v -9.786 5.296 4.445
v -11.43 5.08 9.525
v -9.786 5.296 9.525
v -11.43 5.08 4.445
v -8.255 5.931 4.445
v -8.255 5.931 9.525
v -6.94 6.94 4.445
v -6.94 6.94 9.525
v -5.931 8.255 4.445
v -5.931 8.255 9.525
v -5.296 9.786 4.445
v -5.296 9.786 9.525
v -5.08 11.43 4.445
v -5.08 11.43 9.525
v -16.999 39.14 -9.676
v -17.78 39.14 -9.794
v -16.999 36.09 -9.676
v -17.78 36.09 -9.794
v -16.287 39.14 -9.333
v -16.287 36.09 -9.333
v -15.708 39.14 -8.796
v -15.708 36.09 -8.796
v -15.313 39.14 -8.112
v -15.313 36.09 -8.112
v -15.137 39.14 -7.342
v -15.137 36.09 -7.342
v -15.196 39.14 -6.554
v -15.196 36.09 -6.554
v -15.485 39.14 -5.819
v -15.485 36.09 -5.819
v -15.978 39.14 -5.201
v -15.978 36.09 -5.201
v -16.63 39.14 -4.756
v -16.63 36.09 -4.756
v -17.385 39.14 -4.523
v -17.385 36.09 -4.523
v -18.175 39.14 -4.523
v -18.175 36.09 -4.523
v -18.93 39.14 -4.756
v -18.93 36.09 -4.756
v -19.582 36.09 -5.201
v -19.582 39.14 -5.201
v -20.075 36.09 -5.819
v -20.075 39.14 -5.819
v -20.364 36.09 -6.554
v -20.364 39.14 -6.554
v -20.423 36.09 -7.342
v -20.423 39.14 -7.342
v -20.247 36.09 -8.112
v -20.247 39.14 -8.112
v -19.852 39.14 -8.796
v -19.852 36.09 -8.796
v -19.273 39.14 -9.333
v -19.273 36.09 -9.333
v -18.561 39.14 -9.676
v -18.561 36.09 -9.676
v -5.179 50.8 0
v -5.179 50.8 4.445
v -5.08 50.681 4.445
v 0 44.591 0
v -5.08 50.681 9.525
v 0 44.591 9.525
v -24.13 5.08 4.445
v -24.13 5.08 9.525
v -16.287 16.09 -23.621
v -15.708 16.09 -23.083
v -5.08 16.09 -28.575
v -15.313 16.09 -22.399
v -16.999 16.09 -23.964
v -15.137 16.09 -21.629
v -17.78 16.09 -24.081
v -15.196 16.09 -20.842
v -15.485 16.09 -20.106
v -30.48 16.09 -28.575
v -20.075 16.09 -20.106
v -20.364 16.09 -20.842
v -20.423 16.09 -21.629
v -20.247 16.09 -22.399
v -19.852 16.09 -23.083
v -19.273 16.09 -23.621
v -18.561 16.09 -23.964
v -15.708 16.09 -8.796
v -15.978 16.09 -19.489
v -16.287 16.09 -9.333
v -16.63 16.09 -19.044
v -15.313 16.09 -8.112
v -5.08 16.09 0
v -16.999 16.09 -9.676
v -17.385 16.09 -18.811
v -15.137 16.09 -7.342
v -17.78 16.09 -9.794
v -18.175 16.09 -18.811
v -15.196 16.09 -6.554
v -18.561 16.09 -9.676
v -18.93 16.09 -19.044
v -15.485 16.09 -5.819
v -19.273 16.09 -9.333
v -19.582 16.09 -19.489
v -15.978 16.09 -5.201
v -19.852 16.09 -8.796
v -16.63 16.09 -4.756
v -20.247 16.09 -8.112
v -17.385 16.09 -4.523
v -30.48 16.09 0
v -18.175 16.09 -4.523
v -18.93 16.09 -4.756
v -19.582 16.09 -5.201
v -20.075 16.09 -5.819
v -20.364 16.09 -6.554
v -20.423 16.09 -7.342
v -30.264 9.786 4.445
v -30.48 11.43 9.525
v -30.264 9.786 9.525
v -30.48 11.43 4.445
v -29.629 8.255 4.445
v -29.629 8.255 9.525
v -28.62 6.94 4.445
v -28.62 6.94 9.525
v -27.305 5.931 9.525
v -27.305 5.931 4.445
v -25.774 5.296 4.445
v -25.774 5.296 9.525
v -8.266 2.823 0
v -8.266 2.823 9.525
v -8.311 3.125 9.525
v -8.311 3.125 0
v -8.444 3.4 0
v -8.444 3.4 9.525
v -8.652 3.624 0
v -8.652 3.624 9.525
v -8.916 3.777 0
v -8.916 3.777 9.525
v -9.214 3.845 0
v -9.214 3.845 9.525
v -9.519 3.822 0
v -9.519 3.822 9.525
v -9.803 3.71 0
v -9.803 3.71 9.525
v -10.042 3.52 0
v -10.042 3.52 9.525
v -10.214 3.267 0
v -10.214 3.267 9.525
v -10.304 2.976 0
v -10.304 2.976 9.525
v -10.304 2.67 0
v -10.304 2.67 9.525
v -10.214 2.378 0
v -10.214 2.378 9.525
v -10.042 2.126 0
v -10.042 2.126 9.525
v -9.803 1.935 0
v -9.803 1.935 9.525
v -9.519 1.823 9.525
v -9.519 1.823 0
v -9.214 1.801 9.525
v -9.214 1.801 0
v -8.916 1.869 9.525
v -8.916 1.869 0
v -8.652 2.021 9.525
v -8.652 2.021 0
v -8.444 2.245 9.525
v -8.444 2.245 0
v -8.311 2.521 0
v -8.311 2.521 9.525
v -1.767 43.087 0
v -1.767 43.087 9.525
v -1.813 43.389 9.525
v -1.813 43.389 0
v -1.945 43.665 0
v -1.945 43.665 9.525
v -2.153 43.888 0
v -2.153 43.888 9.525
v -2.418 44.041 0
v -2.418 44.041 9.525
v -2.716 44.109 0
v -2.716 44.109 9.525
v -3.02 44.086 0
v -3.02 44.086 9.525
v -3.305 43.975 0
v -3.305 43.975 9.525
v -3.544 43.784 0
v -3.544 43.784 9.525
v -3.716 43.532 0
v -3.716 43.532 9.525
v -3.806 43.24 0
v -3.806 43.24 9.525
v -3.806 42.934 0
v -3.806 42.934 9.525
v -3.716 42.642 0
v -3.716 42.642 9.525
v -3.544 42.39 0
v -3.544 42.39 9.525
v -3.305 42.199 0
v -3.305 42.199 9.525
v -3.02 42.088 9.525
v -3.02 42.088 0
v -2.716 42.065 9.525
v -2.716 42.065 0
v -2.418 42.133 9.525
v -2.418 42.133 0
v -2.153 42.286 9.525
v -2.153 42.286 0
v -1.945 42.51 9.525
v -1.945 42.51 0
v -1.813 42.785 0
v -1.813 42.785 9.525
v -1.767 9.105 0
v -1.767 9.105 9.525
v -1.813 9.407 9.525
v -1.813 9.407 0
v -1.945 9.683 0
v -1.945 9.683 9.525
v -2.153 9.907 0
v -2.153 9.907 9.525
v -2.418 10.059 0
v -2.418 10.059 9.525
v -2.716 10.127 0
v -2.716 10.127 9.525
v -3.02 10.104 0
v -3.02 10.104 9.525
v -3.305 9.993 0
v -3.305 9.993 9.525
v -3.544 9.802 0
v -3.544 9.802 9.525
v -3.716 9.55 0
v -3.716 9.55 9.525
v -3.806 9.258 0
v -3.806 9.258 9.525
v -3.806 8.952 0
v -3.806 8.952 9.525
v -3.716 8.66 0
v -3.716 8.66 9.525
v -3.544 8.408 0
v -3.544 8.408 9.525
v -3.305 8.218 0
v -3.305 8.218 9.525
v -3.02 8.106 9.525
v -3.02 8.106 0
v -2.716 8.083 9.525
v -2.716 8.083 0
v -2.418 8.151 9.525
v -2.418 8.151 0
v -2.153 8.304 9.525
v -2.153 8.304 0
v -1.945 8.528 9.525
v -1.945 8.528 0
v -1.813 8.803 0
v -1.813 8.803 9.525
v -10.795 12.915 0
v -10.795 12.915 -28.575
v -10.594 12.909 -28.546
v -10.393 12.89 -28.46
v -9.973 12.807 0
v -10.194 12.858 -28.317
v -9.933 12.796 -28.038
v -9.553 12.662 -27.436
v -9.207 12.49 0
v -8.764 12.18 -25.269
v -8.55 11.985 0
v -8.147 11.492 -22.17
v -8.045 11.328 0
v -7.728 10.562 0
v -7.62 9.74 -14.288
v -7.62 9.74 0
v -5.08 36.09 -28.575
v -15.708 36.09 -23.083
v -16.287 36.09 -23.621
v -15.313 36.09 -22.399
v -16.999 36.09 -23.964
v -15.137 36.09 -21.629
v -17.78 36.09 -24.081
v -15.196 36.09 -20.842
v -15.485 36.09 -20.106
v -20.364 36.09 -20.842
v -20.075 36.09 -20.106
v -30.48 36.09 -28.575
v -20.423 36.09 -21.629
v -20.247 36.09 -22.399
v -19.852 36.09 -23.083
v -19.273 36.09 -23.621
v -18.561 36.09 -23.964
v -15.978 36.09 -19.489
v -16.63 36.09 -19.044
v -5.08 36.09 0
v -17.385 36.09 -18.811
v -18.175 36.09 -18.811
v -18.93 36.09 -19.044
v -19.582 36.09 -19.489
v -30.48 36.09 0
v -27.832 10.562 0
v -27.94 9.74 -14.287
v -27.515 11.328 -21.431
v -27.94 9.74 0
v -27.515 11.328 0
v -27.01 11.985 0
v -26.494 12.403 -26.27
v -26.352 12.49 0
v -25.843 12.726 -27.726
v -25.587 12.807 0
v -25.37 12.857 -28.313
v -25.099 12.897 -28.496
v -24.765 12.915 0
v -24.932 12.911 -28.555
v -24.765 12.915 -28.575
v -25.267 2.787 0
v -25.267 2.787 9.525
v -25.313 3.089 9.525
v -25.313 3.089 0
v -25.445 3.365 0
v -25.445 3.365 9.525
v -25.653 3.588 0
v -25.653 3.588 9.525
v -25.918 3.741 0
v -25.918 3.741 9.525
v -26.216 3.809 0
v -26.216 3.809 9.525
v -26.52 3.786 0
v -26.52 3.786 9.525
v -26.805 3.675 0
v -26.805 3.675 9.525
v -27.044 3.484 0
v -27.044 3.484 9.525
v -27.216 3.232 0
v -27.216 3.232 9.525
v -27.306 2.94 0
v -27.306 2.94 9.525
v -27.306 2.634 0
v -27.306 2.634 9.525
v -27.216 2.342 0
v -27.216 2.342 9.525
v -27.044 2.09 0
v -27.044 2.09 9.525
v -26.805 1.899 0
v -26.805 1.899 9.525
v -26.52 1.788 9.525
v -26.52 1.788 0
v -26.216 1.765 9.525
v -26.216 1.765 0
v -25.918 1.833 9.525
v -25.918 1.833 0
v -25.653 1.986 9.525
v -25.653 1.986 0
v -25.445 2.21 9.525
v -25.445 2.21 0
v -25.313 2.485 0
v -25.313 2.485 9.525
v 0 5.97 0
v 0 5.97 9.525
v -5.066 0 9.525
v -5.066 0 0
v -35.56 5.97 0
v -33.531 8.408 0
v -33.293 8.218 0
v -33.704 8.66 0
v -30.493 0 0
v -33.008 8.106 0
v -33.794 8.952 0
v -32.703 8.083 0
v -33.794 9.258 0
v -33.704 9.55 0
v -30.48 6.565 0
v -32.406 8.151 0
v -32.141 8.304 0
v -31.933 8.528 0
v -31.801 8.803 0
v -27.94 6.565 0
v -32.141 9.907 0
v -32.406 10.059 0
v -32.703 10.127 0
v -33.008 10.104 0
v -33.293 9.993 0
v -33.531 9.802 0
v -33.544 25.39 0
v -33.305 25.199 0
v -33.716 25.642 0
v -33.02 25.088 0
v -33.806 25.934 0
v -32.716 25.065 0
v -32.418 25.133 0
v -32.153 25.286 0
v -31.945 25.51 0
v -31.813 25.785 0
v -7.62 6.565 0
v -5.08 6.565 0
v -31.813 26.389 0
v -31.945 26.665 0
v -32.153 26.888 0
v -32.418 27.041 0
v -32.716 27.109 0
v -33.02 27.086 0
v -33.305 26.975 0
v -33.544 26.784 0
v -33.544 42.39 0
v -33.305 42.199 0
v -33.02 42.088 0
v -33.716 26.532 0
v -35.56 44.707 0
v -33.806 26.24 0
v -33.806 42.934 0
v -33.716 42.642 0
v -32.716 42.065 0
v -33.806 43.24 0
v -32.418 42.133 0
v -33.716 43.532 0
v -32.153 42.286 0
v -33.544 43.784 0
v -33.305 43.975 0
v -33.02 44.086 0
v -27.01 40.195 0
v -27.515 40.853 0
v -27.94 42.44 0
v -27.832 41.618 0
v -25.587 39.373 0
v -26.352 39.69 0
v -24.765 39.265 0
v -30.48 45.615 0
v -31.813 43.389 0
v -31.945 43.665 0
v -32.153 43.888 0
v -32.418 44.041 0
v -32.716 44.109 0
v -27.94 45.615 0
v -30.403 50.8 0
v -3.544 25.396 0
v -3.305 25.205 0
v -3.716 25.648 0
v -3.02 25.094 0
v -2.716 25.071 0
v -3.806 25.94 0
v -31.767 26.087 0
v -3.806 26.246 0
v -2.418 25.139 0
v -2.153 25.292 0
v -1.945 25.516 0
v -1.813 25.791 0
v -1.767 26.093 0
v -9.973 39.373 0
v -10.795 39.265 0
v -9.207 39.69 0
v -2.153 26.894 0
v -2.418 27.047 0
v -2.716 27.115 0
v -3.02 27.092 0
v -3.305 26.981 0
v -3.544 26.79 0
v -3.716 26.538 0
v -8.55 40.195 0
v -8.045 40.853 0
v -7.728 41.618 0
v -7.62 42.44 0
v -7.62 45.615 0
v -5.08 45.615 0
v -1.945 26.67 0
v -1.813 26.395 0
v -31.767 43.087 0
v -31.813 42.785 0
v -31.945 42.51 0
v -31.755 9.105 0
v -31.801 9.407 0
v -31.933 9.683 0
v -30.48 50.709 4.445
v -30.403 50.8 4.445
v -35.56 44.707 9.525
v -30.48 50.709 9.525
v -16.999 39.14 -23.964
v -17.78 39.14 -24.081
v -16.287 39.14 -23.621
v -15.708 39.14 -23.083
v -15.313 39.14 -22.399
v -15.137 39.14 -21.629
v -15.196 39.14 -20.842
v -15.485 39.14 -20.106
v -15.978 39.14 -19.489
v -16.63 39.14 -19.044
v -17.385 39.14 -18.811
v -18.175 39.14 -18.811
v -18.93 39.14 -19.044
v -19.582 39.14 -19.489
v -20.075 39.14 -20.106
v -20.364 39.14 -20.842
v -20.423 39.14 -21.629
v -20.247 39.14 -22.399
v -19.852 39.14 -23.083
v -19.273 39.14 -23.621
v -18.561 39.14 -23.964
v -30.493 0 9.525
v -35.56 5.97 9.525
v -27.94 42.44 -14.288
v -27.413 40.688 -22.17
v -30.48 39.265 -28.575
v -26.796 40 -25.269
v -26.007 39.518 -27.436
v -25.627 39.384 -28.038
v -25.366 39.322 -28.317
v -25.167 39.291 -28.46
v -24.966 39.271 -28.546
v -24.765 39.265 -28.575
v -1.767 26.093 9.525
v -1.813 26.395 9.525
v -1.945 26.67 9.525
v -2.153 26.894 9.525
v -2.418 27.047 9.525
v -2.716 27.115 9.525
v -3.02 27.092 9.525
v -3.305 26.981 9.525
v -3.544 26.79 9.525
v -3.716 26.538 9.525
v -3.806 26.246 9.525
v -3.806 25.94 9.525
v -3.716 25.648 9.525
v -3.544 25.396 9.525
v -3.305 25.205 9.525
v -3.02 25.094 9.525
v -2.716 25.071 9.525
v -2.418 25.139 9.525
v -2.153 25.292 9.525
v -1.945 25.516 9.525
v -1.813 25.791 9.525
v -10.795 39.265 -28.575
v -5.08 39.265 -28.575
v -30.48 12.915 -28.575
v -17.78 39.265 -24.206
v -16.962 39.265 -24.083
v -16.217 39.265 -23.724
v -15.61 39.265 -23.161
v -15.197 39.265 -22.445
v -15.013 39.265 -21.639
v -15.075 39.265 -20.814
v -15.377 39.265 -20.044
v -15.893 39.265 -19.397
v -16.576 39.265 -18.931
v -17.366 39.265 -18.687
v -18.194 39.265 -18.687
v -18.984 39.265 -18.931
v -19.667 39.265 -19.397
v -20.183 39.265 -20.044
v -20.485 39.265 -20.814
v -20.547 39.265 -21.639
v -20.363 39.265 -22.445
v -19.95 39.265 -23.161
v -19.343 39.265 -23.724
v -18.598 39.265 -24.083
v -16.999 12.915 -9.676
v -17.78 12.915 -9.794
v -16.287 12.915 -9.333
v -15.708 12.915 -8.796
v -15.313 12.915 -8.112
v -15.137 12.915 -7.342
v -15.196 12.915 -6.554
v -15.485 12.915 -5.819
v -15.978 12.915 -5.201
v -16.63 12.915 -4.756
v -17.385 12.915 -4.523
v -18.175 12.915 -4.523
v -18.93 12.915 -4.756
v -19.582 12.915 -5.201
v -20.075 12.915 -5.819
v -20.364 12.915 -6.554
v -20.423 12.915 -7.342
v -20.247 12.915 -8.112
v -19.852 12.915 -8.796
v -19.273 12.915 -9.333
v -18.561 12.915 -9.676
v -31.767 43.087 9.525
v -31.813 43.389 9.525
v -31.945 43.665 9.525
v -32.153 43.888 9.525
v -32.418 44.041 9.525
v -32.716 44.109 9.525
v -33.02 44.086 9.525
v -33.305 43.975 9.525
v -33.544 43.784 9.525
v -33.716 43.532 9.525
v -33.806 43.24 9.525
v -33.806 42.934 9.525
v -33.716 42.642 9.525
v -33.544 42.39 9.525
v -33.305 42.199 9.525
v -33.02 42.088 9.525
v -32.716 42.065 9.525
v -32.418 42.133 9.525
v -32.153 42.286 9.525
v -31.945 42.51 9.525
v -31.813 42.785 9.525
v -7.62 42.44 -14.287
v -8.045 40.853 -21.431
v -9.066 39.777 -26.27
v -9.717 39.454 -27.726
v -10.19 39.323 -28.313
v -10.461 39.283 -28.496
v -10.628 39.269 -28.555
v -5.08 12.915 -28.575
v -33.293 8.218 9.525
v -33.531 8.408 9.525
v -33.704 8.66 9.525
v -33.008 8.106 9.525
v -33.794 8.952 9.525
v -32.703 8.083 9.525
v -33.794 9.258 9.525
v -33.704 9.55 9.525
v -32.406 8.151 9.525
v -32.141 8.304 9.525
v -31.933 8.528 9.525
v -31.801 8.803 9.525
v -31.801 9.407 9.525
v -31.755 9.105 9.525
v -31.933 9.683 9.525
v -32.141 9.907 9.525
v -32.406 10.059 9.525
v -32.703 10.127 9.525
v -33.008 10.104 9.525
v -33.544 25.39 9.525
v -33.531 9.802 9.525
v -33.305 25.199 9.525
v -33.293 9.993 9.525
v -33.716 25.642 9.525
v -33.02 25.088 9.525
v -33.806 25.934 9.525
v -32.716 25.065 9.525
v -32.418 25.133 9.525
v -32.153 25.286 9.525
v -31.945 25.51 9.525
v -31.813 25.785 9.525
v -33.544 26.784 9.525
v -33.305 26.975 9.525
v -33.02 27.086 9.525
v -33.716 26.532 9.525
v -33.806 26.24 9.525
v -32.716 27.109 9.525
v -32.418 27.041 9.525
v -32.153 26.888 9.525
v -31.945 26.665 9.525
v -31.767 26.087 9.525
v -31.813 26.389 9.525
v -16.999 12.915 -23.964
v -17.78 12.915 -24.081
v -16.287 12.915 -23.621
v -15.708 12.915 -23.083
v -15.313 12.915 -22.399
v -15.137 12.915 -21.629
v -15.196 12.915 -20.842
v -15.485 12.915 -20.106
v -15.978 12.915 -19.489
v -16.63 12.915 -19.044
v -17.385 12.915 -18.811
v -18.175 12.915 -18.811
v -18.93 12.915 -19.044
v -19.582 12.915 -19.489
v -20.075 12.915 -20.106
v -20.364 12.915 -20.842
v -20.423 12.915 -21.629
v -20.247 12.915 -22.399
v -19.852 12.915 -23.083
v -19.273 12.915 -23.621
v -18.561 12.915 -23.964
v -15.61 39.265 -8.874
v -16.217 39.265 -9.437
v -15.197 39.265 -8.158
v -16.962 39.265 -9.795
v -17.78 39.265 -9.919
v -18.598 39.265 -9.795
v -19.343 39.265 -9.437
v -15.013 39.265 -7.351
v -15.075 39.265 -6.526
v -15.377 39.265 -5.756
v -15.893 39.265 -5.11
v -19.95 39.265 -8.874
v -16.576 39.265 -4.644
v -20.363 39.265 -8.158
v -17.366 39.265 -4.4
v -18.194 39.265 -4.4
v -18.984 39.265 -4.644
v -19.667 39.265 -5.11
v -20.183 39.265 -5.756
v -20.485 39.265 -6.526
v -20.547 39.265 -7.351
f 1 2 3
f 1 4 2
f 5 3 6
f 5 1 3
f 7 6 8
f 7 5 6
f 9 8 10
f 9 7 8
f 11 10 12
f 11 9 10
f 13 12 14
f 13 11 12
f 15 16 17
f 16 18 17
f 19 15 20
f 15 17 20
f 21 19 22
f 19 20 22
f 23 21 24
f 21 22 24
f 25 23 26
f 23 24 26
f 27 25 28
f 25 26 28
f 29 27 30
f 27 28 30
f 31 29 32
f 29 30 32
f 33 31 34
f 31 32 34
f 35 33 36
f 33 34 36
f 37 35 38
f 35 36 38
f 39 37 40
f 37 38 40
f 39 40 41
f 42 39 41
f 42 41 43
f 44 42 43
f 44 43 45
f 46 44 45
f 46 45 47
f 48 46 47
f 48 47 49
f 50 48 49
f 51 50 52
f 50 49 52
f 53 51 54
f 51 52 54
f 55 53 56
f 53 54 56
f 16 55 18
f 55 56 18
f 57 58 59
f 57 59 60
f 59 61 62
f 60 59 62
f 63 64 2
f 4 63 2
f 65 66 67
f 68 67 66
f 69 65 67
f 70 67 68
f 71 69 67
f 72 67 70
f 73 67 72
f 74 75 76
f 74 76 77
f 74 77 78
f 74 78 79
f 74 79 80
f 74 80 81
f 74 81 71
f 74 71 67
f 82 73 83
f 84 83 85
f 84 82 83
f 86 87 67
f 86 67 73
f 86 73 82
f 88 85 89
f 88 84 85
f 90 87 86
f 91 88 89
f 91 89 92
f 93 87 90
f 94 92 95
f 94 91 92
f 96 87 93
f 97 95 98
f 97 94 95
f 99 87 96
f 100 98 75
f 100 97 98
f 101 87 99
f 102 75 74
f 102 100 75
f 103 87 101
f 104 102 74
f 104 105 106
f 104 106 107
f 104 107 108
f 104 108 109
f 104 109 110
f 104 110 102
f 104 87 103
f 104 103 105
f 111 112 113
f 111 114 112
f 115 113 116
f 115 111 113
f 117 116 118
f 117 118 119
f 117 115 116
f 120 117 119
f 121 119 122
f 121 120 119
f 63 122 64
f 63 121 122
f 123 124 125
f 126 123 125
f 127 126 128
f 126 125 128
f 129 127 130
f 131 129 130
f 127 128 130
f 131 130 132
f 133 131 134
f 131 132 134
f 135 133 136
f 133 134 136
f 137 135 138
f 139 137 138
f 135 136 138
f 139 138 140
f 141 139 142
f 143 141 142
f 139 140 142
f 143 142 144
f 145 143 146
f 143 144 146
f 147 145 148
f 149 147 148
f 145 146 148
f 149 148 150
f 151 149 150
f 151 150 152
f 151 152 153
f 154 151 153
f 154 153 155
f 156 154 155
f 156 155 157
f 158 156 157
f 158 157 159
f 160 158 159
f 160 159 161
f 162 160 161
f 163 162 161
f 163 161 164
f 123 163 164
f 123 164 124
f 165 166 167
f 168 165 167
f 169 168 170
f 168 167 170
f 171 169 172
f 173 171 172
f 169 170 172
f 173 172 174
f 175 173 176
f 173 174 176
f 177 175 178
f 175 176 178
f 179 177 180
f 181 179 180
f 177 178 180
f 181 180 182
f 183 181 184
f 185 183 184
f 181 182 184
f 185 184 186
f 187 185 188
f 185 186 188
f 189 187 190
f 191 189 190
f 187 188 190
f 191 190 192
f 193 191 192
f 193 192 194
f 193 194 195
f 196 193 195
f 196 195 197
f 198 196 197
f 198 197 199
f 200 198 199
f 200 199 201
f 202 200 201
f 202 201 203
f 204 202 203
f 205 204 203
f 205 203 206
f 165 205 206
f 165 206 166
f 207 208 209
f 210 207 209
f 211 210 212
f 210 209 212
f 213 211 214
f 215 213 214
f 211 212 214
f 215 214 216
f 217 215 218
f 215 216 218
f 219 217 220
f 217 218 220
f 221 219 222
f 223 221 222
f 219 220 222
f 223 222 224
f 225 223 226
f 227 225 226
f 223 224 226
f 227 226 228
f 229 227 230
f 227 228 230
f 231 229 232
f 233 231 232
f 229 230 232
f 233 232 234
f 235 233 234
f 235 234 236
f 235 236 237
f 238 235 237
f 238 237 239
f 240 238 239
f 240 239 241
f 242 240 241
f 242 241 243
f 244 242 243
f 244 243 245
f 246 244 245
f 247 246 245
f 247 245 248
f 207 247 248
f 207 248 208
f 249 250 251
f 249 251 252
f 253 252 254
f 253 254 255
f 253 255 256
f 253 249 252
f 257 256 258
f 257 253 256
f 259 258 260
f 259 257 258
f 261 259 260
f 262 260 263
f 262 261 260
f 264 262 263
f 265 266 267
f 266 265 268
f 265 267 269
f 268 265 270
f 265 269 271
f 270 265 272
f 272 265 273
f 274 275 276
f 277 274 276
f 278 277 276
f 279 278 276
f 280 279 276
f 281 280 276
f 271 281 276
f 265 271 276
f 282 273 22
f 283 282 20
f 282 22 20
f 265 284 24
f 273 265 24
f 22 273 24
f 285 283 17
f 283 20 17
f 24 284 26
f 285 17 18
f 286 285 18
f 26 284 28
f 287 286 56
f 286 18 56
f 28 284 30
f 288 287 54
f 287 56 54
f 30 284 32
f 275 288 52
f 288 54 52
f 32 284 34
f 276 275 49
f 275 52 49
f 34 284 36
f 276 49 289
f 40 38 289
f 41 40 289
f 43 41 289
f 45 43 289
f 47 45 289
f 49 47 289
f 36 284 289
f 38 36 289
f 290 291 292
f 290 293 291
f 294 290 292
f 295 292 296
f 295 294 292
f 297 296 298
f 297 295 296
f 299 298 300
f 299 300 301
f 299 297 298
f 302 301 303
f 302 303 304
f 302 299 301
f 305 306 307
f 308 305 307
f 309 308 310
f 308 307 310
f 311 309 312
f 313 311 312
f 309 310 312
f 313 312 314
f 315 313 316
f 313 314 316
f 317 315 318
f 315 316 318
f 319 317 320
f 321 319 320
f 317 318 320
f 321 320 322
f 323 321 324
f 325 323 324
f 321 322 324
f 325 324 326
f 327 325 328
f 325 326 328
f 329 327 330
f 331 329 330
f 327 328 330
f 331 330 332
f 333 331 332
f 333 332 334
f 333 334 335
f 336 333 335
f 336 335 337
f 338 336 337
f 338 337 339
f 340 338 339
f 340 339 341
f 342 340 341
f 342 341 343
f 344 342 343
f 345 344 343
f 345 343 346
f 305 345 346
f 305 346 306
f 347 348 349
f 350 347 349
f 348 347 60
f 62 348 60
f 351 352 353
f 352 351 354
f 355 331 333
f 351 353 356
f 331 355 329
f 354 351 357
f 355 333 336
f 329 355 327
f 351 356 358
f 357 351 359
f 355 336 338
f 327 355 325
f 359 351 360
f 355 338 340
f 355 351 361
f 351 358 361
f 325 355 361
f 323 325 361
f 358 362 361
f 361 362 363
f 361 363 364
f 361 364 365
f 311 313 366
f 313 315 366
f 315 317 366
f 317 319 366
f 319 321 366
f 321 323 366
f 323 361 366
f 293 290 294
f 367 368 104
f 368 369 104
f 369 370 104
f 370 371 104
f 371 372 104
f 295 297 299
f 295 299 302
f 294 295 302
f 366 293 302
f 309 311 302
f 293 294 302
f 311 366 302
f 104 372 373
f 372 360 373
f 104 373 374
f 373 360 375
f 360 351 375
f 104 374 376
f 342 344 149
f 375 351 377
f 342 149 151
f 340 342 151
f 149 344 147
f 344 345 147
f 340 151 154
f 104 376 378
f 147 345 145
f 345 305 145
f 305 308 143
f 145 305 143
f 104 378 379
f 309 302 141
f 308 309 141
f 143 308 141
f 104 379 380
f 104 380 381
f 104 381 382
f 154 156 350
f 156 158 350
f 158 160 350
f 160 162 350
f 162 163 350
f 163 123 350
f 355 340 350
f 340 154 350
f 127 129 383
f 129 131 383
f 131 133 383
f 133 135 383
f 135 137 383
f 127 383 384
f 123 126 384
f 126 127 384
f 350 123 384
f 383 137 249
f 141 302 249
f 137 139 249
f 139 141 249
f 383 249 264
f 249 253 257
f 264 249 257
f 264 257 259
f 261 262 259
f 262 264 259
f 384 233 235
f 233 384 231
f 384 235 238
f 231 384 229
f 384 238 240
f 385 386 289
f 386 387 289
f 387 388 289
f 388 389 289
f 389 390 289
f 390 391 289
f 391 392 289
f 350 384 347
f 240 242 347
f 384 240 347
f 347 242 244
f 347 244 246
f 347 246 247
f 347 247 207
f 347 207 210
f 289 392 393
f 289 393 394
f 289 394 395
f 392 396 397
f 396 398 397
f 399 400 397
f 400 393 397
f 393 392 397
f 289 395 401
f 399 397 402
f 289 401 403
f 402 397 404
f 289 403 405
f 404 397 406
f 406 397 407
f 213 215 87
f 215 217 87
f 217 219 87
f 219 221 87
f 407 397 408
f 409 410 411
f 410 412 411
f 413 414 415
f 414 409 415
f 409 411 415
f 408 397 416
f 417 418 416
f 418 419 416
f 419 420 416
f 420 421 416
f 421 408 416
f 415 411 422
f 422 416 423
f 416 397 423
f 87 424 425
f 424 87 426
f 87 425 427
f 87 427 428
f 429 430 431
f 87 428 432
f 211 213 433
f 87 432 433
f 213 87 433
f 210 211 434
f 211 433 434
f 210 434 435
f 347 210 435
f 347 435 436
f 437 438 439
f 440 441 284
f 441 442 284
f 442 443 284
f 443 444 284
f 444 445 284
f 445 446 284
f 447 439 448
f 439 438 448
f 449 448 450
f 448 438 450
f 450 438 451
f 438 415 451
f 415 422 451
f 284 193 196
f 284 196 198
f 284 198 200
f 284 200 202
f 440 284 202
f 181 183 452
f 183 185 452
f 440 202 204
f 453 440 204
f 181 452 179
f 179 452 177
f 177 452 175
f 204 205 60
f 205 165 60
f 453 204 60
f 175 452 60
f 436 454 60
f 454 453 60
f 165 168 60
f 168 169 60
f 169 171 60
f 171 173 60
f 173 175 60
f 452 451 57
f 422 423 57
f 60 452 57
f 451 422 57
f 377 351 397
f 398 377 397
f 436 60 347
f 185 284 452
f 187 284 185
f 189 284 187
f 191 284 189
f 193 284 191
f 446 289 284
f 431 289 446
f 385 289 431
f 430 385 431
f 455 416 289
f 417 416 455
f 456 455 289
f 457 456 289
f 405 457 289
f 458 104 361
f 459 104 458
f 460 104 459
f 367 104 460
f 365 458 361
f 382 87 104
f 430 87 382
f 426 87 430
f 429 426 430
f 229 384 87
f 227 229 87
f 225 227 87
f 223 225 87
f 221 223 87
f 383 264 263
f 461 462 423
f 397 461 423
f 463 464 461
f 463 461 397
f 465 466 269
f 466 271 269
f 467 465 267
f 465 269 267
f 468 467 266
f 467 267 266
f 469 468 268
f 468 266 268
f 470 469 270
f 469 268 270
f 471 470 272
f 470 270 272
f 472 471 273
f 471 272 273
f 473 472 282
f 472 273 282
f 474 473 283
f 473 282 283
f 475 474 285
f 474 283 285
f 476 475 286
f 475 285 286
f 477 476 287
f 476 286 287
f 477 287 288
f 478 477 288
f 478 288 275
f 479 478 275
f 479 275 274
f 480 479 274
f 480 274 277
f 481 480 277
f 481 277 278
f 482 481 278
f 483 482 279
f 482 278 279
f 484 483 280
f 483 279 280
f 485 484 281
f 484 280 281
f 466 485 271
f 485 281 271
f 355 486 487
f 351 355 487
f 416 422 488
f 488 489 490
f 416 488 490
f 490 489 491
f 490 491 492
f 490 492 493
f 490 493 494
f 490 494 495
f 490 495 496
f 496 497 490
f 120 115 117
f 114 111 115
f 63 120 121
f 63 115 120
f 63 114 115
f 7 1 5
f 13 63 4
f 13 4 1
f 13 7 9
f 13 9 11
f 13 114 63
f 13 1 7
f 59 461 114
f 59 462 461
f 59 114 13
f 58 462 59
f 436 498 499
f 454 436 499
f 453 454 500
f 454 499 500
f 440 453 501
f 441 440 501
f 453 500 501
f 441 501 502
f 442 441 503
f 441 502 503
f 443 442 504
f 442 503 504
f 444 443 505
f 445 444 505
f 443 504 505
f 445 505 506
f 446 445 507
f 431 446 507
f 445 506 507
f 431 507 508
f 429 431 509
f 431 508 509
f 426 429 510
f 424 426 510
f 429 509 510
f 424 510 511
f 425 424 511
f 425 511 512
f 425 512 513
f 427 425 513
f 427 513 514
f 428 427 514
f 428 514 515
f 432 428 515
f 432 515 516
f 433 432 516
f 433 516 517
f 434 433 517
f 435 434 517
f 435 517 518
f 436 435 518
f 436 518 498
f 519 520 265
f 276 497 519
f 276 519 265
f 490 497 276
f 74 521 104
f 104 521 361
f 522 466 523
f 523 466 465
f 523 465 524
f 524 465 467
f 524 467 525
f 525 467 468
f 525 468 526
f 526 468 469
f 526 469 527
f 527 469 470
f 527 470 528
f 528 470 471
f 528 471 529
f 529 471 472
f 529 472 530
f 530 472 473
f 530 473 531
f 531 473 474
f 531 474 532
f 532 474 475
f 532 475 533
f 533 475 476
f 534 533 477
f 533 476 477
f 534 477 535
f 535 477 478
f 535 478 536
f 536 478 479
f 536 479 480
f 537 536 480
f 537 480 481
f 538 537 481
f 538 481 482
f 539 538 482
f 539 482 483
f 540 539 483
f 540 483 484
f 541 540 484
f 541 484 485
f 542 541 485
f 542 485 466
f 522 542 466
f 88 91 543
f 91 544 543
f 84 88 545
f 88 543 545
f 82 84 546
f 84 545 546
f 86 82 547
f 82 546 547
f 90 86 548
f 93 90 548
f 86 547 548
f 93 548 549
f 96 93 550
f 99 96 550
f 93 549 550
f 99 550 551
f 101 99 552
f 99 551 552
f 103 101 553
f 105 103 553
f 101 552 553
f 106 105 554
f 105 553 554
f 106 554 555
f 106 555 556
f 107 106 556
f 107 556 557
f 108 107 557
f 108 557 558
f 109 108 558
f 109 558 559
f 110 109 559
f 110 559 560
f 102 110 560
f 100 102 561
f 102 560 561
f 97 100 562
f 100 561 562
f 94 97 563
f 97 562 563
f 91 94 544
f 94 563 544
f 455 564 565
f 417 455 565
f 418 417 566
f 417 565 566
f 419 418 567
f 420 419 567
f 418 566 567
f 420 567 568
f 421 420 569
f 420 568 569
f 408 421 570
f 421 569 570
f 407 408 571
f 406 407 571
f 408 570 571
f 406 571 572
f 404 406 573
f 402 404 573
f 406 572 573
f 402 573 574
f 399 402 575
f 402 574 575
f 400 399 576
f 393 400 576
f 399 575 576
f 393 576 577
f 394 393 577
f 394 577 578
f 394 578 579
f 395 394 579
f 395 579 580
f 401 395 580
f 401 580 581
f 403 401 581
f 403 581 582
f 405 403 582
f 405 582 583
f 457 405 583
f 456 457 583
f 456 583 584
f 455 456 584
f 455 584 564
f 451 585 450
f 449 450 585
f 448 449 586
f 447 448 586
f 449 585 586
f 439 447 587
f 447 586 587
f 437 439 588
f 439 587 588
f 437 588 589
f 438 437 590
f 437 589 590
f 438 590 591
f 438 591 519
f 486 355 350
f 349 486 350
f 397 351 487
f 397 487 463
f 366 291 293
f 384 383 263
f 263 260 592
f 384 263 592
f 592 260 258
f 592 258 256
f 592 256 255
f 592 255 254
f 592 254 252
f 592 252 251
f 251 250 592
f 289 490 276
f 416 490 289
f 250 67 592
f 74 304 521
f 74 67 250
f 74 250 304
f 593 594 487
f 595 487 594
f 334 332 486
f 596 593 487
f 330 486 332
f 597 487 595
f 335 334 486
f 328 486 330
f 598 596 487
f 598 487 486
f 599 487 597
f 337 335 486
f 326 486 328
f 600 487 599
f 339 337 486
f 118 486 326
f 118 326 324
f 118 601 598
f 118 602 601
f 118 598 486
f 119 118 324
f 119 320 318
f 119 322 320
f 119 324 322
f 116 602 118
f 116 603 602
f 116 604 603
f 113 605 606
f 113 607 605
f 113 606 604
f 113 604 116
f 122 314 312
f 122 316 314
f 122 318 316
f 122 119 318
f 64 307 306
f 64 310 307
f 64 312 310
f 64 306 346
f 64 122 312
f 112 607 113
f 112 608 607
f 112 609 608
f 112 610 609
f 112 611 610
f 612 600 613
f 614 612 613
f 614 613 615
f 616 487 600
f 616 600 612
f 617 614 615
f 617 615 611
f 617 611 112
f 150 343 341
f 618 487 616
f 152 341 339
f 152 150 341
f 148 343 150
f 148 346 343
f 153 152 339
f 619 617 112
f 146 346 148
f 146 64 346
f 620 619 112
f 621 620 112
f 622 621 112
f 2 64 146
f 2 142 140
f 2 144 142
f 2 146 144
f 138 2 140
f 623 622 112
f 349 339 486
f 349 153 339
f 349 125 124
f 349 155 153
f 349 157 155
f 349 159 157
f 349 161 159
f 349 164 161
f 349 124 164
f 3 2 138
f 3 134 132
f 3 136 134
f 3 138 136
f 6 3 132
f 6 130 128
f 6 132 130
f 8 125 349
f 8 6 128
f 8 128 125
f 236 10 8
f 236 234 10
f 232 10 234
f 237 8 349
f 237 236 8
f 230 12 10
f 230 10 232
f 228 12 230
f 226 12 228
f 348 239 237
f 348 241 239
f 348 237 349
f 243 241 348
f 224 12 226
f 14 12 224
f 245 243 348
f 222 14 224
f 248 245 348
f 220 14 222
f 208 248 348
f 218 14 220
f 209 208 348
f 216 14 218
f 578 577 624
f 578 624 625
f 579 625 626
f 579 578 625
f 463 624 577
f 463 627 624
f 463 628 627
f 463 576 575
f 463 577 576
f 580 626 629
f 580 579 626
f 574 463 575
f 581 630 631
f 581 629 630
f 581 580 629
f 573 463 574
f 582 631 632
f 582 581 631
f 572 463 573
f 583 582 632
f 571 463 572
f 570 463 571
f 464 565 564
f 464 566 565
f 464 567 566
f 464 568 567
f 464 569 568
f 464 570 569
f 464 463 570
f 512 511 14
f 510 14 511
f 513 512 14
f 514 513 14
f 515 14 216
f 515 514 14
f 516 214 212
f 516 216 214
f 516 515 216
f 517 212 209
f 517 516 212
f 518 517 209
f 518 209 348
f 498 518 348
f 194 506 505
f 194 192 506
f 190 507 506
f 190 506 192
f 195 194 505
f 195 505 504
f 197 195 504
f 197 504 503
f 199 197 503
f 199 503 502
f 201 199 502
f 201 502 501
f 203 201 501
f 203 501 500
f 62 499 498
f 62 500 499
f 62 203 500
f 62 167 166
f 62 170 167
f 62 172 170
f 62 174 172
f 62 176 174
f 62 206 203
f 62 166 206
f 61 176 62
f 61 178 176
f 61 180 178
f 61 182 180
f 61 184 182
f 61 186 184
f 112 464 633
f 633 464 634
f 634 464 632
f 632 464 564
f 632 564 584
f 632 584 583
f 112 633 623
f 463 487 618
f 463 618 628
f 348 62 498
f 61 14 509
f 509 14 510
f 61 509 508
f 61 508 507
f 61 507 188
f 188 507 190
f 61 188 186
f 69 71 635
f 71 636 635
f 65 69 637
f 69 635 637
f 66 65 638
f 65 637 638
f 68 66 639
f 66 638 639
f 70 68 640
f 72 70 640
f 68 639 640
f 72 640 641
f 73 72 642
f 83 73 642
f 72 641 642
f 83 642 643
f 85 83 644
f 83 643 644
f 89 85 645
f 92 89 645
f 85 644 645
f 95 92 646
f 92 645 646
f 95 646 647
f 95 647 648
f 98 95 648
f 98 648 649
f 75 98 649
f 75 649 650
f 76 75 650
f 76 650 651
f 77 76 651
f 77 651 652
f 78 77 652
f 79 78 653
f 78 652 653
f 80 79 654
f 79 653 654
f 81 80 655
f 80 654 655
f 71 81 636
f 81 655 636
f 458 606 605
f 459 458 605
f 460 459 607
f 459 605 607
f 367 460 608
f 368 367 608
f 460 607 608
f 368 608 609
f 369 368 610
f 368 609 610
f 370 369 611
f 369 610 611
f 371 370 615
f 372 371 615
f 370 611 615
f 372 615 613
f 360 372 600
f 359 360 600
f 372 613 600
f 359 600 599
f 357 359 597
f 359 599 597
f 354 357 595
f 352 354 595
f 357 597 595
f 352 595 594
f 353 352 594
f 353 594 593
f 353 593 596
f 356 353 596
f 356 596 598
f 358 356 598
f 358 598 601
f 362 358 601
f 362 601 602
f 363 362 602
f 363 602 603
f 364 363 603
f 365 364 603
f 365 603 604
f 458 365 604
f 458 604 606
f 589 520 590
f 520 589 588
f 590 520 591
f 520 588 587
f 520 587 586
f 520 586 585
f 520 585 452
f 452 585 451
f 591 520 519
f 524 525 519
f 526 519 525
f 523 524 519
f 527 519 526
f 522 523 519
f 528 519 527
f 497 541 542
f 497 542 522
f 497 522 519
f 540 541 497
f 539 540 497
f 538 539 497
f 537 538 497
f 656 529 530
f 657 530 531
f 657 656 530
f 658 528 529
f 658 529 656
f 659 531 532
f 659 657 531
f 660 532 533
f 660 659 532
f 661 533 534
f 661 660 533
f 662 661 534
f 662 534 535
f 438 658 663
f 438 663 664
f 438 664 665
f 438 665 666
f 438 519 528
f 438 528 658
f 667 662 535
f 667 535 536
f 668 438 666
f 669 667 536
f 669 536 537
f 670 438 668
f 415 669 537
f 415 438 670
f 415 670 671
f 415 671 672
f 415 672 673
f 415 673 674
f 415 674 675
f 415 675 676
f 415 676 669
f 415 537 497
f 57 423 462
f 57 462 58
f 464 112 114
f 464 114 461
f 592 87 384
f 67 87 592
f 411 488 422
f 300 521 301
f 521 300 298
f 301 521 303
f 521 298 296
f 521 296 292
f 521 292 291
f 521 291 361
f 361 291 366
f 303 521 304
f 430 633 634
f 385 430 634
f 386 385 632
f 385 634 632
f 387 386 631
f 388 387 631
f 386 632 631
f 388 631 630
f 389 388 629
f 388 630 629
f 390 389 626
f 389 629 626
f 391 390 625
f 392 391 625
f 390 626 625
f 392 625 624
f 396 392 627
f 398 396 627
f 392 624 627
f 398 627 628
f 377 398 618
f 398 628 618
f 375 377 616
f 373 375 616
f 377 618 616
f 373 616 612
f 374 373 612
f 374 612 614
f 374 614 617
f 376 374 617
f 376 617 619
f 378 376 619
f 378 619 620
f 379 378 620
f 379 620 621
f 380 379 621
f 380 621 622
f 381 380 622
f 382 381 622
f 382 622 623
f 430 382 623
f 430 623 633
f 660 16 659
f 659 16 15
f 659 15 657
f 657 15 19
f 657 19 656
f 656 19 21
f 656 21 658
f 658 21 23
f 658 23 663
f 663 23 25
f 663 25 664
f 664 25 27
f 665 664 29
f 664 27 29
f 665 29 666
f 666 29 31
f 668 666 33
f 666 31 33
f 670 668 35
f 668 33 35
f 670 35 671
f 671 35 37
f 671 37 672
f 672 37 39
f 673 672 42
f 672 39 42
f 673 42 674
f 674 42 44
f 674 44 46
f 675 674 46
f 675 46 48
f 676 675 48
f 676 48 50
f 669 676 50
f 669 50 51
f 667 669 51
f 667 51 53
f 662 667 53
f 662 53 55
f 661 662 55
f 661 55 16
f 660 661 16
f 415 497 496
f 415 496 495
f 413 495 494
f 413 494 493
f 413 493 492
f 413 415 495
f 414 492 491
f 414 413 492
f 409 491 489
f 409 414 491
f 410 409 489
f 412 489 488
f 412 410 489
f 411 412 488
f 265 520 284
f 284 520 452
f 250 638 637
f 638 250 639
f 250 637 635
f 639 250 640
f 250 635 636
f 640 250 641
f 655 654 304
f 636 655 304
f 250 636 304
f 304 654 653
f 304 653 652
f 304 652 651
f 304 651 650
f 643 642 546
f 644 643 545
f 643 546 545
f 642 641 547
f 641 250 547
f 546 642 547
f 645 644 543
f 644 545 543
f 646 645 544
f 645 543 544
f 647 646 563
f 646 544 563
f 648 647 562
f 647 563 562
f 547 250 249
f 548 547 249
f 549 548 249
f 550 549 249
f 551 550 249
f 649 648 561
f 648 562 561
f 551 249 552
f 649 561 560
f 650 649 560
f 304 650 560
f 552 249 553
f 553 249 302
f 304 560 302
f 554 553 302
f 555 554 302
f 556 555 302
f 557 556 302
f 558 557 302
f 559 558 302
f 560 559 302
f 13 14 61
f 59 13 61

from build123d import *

# Parameters (mm, degrees)
SKETCH1_W                      = 35.56
SKETCH1_H                      = 50.8
BOSS_EXTRUDE1_DEPTH            = 9.525
SKETCH2_W                      = 25.4
SKETCH2_H                      = 45.72
CUT_EXTRUDE2_DEPTH             = 5.08
TAP_DRILL_FOR_M2_5X0_45_TAP1_D = 2.05
SKETCH13_W                     = 25.4
SKETCH13_H                     = 3.175
BOSS_EXTRUDE2_DEPTH            = 28.575
CUT_EXTRUDE3_DEPTH             = 73.778867812
FILLET1_R                      = 6.35
M5_CLEARANCE_HOLE1_D           = 5.3
M5_CLEARANCE_HOLE1_CSINK_D     = 5.55
M5_CLEARANCE_HOLE1_CSINK_ANGLE = 90
RIB7_REACH                     = 67.774
SKETCH14_WALL_W                = 162.819779212
SKETCH14_WALL_H                = 2.54
RIB8_REACH                     = 67.774
SKETCH15_WALL_W                = 162.819779212
SKETCH15_WALL_H                = 2.54
RIB9_REACH                     = 67.774
SKETCH17_WALL_W                = 162.819779212
SKETCH17_WALL_H                = 2.54
RIB10_REACH                    = 67.774
SKETCH16_WALL_W                = 162.819779212
SKETCH16_WALL_H                = 2.54
FILLET2_R                      = 3.175
FILLET3_R                      = 3.175


with BuildPart() as part:
    # Sketch1 → Boss-Extrude1 (new body)
    with BuildSketch(Plane.XY):
        with Locations((-17.78, 25.4)):
            Rectangle(SKETCH1_W, SKETCH1_H)
    extrude(amount=BOSS_EXTRUDE1_DEPTH)

    # Sketch2 → Cut-Extrude2 (cut)
    with BuildSketch(Plane.XY.offset(9.525)):
        with Locations((-17.78, 27.94)):
            Rectangle(SKETCH2_W, SKETCH2_H)
    extrude(amount=-CUT_EXTRUDE2_DEPTH, mode=Mode.SUBTRACT)

    # Tap Drill for M2.5x0.45 Tap1 (through all)
    with Locations(Plane(origin=(0, 0, 0), x_dir=(-1, 0, 0), z_dir=(0, 0, -1))):
        with Locations((2.792369004, 43.087106138), (2.792369004, 26.092979092), (2.792369004, 9.105182099), (9.290740849, 2.822744672), (26.292369004, 2.787106138), (32.780032006, 9.105182099), (32.792369004, 26.087106138), (32.792369004, 43.087106138)):
            Hole(TAP_DRILL_FOR_M2_5X0_45_TAP1_D / 2)

    # Sketch13 → Boss-Extrude2 (add)
    with BuildSketch(Plane(origin=(0, 0, 0), x_dir=(-1, 0, 0), z_dir=(0, 0, -1))):
        with Locations((17.78, 37.677545037)):
            Rectangle(SKETCH13_W, SKETCH13_H)
        with Locations((17.78, 14.502545037)):
            Rectangle(SKETCH13_W, SKETCH13_H)
    extrude(amount=BOSS_EXTRUDE2_DEPTH)

    # Sketch8 → Cut-Extrude3 (cut, through all)
    with BuildSketch(Plane.XY.offset(9.525)):
        Polygon((-5.178964387, 50.8), (0, 44.591495864), (0, 50.8), align=None)
        Polygon((-35.56, 44.706622517), (-35.56, 50.8), (-30.402645731, 50.8), align=None)
        Polygon((-35.56, 5.970049098), (-35.56, 0), (-30.492594088, 0), align=None)
        Polygon((-5.092594088, -0.031324356), (0, 0), (0, 5.970049098), align=None)
    extrude(amount=-CUT_EXTRUDE3_DEPTH, mode=Mode.SUBTRACT)

    # Fillet1
    fillet1_edges = [part.edges().sort_by_distance(p)[0] for p in [
        (-5.08, 5.08, 6.985),
        (-30.48, 5.08, 6.985),
    ]]
    fillet(fillet1_edges, radius=FILLET1_R)

    # M5 Clearance Hole1 (through all)
    with Locations(Plane(origin=(-17.78, 39.265045037, -7.14375), x_dir=(0, 0, 1), z_dir=(0, 1, 0))):
        with Locations((0, 0), (-14.2875, 0)):
            CounterSinkHole(M5_CLEARANCE_HOLE1_D / 2, M5_CLEARANCE_HOLE1_CSINK_D / 2, counter_sink_angle=M5_CLEARANCE_HOLE1_CSINK_ANGLE)

    # Sketch14 wall → Rib7 (add, up to next)
    with BuildSketch(Plane(origin=(-30.48, 9.740045037, -14.2875), x_dir=(0, -0.216930457819, 0.976187060184), z_dir=(0, 0.976187060184, 0.216930457819)), mode=Mode.PRIVATE) as rib7_sk1:
        with Locations((0, 1.27)):
            Rectangle(SKETCH14_WALL_W, SKETCH14_WALL_H)
    rib7_tool1 = extrude(rib7_sk1.sketch, amount=RIB7_REACH, mode=Mode.PRIVATE) - part.part
    add(rib7_tool1.solids().sort_by_distance((-30.48, 9.740045037, -14.2875))[0])

    # Sketch15 wall → Rib8 (add, up to next)
    with BuildSketch(Plane(origin=(-5.08, 9.740045037, -14.2875), x_dir=(0, -0.216930457819, 0.976187060184), z_dir=(0, -0.976187060184, -0.216930457819)), mode=Mode.PRIVATE) as rib8_sk1:
        with Locations((0, 1.27)):
            Rectangle(SKETCH15_WALL_W, SKETCH15_WALL_H)
    rib8_tool1 = extrude(rib8_sk1.sketch, amount=-RIB8_REACH, mode=Mode.PRIVATE) - part.part
    add(rib8_tool1.solids().sort_by_distance((-5.08, 9.740045037, -14.2875))[0])

    # Sketch17 wall → Rib9 (add, up to next)
    with BuildSketch(Plane(origin=(-5.08, 42.440045037, -14.2875), x_dir=(0, 0.216930457819, 0.976187060184), z_dir=(0, -0.976187060184, 0.216930457819)), mode=Mode.PRIVATE) as rib9_sk1:
        with Locations((0, 1.27)):
            Rectangle(SKETCH17_WALL_W, SKETCH17_WALL_H)
    rib9_tool1 = extrude(rib9_sk1.sketch, amount=RIB9_REACH, mode=Mode.PRIVATE) - part.part
    add(rib9_tool1.solids().sort_by_distance((-5.08, 42.440045037, -14.2875))[0])

    # Sketch16 wall → Rib10 (add, up to next)
    with BuildSketch(Plane(origin=(-30.48, 42.440045037, -14.2875), x_dir=(0, 0.216930457819, 0.976187060184), z_dir=(0, 0.976187060184, -0.216930457819)), mode=Mode.PRIVATE) as rib10_sk1:
        with Locations((0, 1.27)):
            Rectangle(SKETCH16_WALL_W, SKETCH16_WALL_H)
    rib10_tool1 = extrude(rib10_sk1.sketch, amount=-RIB10_REACH, mode=Mode.PRIVATE) - part.part
    add(rib10_tool1.solids().sort_by_distance((-30.48, 42.440045037, -14.2875))[0])

    # Fillet2
    fillet2_edges = [part.edges().sort_by_distance(p)[0] for p in [
        (-27.94, 12.915045037, -14.2875),
        (-7.62, 12.915045037, -14.2875),
    ]]
    fillet(fillet2_edges, radius=FILLET2_R)

    # Fillet3
    fillet3_edges = [part.edges().sort_by_distance(p)[0] for p in [
        (-7.62, 39.265045037, -14.2875),
        (-27.94, 39.265045037, -14.2875),
    ]]
    fillet(fillet3_edges, radius=FILLET3_R)


solid = part.part
